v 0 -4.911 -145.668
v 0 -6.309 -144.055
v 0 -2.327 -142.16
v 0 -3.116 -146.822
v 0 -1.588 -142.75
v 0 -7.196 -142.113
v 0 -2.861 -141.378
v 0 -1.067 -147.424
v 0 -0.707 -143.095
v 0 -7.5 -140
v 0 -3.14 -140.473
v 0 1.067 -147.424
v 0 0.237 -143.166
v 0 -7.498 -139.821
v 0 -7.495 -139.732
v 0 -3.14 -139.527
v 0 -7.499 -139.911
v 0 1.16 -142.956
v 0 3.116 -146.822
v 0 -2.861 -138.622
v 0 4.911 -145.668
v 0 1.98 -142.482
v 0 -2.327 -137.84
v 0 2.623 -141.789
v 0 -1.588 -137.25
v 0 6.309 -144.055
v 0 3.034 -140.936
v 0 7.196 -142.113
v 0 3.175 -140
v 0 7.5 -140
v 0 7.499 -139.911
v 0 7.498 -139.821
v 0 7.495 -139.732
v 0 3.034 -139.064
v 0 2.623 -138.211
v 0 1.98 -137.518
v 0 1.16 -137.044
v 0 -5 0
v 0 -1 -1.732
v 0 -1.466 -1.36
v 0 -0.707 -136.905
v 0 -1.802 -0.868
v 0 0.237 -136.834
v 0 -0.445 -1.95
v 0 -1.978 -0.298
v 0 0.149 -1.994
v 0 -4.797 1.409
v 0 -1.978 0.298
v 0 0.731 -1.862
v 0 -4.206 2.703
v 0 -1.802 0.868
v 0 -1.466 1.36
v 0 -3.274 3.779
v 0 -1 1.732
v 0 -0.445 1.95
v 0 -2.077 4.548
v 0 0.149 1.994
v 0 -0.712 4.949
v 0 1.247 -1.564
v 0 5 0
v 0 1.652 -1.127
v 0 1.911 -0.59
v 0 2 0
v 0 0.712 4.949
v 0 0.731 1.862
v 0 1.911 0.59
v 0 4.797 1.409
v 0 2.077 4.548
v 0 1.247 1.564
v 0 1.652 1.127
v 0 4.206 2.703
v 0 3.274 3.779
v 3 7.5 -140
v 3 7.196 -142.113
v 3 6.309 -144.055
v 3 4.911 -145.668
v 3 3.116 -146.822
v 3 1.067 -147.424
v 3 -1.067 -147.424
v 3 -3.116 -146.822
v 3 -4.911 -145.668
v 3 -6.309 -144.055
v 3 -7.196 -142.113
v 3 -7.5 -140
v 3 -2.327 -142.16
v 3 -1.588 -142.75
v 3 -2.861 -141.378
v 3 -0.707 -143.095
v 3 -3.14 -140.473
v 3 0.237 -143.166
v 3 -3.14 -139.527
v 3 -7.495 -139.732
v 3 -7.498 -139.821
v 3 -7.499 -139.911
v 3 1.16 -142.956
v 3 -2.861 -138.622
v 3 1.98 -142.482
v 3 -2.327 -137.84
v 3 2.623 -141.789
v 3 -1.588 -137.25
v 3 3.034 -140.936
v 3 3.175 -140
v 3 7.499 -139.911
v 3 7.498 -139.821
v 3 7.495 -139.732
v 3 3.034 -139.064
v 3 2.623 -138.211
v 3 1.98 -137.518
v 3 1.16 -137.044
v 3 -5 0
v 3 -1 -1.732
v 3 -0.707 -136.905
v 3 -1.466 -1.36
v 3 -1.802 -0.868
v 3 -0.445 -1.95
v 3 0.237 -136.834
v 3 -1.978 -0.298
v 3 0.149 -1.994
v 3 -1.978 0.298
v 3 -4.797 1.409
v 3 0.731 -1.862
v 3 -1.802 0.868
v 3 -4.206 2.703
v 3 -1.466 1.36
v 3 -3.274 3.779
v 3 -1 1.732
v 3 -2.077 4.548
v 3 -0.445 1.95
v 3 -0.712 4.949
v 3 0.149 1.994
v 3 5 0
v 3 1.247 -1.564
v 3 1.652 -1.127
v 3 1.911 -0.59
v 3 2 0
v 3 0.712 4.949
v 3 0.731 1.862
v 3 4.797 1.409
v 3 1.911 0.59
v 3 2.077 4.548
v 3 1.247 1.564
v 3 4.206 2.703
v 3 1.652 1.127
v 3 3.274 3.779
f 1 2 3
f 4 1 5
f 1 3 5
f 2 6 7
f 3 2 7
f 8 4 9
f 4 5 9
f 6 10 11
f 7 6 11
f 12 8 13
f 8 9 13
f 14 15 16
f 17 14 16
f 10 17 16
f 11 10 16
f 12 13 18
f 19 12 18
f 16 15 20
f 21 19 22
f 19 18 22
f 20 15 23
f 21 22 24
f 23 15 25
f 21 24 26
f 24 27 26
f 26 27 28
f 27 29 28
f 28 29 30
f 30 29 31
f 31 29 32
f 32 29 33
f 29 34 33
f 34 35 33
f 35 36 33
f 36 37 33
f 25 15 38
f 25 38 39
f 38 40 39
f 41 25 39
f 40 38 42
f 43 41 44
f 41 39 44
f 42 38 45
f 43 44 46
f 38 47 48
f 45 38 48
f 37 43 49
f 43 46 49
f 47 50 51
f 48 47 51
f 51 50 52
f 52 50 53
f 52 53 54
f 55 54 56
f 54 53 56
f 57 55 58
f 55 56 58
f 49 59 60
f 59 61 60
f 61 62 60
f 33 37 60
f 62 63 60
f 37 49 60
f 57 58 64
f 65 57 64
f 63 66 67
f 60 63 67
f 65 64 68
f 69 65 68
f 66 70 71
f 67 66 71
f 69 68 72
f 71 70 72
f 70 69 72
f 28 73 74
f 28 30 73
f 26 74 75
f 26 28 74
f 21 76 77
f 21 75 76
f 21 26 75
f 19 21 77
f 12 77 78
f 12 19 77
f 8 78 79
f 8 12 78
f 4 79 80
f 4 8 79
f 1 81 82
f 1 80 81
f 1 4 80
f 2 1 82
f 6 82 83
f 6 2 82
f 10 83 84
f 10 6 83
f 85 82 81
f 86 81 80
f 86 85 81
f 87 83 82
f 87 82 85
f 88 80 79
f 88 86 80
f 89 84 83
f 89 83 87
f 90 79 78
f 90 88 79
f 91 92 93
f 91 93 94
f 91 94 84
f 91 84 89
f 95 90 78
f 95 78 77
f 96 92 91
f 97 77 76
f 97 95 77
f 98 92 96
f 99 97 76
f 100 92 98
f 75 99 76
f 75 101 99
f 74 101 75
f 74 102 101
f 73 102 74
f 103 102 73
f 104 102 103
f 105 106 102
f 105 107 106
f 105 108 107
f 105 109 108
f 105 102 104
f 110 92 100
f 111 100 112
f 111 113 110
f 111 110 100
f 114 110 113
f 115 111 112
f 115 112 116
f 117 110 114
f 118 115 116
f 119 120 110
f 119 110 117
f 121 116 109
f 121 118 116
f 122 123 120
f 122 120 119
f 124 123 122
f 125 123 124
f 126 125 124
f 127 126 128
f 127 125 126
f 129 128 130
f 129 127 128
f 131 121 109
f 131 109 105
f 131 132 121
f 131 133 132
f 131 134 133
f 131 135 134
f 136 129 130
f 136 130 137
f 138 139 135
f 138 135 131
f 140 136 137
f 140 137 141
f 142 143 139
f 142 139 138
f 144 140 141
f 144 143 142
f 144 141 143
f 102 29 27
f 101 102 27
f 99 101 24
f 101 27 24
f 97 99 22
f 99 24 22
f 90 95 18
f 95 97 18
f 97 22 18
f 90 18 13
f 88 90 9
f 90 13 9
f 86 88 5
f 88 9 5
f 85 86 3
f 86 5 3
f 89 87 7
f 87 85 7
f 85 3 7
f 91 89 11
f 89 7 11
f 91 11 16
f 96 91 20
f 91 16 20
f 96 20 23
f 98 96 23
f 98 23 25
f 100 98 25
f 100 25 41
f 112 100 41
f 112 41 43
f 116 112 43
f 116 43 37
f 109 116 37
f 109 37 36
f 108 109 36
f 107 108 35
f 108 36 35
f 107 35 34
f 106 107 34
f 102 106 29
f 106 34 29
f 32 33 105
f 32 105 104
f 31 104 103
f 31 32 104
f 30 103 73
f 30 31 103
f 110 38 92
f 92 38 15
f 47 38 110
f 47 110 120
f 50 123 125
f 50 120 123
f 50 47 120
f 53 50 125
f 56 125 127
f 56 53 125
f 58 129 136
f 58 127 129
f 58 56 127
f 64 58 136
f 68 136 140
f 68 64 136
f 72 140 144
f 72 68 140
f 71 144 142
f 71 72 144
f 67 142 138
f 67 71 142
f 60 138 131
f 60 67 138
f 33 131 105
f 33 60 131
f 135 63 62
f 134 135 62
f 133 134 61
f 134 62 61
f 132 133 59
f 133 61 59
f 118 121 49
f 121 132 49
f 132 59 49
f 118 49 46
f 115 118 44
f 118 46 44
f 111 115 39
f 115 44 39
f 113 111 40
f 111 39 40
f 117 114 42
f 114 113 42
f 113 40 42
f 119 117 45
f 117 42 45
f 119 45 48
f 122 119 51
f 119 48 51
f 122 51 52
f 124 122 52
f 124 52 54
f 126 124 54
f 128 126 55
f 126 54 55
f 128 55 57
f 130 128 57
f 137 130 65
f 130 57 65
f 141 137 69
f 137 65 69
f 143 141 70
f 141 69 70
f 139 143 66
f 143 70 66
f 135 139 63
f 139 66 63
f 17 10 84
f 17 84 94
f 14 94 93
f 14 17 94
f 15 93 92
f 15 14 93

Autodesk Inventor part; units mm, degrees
ref_plane "YZ Plane" through (0, 0, 0) normal (1, 0, 0) x (0, 1, 0)
ref_plane "XZ Plane" through (0, 0, 0) normal (0, 1, 0) x (-1, 0, 0)
ref_plane "XY Plane" through (0, 0, 0) normal (0, 0, 1) x (1, 0, 0)
sketch "Boceto1" plane through (0, 0, 0) normal (1, 0, 0) x (0, 1, 0)
  circle A0 centre (0, 0) radius 2
  arc A1 (5, 0) -> (-5, 0) centre (0, 0) ccw
  circle A2 centre (0, -140) radius 3.175
  arc A3 (-7.4952, -139.7322) -> (7.4952, -139.7322) centre (0, -140) ccw
  line L0 (5, 0) -> (7.5, -140)
  line L1 (-5, 0) -> (-7.5, -140)
  dimension "d0" = 4
  dimension "d1" = 10
  dimension "d2" = 6.35
  dimension "d3" = 140
  dimension "d4" = 15
extrude "Extrusión1" add sketch "Boceto1" along normal blind 3
properties part number "Transmision_Sup"
